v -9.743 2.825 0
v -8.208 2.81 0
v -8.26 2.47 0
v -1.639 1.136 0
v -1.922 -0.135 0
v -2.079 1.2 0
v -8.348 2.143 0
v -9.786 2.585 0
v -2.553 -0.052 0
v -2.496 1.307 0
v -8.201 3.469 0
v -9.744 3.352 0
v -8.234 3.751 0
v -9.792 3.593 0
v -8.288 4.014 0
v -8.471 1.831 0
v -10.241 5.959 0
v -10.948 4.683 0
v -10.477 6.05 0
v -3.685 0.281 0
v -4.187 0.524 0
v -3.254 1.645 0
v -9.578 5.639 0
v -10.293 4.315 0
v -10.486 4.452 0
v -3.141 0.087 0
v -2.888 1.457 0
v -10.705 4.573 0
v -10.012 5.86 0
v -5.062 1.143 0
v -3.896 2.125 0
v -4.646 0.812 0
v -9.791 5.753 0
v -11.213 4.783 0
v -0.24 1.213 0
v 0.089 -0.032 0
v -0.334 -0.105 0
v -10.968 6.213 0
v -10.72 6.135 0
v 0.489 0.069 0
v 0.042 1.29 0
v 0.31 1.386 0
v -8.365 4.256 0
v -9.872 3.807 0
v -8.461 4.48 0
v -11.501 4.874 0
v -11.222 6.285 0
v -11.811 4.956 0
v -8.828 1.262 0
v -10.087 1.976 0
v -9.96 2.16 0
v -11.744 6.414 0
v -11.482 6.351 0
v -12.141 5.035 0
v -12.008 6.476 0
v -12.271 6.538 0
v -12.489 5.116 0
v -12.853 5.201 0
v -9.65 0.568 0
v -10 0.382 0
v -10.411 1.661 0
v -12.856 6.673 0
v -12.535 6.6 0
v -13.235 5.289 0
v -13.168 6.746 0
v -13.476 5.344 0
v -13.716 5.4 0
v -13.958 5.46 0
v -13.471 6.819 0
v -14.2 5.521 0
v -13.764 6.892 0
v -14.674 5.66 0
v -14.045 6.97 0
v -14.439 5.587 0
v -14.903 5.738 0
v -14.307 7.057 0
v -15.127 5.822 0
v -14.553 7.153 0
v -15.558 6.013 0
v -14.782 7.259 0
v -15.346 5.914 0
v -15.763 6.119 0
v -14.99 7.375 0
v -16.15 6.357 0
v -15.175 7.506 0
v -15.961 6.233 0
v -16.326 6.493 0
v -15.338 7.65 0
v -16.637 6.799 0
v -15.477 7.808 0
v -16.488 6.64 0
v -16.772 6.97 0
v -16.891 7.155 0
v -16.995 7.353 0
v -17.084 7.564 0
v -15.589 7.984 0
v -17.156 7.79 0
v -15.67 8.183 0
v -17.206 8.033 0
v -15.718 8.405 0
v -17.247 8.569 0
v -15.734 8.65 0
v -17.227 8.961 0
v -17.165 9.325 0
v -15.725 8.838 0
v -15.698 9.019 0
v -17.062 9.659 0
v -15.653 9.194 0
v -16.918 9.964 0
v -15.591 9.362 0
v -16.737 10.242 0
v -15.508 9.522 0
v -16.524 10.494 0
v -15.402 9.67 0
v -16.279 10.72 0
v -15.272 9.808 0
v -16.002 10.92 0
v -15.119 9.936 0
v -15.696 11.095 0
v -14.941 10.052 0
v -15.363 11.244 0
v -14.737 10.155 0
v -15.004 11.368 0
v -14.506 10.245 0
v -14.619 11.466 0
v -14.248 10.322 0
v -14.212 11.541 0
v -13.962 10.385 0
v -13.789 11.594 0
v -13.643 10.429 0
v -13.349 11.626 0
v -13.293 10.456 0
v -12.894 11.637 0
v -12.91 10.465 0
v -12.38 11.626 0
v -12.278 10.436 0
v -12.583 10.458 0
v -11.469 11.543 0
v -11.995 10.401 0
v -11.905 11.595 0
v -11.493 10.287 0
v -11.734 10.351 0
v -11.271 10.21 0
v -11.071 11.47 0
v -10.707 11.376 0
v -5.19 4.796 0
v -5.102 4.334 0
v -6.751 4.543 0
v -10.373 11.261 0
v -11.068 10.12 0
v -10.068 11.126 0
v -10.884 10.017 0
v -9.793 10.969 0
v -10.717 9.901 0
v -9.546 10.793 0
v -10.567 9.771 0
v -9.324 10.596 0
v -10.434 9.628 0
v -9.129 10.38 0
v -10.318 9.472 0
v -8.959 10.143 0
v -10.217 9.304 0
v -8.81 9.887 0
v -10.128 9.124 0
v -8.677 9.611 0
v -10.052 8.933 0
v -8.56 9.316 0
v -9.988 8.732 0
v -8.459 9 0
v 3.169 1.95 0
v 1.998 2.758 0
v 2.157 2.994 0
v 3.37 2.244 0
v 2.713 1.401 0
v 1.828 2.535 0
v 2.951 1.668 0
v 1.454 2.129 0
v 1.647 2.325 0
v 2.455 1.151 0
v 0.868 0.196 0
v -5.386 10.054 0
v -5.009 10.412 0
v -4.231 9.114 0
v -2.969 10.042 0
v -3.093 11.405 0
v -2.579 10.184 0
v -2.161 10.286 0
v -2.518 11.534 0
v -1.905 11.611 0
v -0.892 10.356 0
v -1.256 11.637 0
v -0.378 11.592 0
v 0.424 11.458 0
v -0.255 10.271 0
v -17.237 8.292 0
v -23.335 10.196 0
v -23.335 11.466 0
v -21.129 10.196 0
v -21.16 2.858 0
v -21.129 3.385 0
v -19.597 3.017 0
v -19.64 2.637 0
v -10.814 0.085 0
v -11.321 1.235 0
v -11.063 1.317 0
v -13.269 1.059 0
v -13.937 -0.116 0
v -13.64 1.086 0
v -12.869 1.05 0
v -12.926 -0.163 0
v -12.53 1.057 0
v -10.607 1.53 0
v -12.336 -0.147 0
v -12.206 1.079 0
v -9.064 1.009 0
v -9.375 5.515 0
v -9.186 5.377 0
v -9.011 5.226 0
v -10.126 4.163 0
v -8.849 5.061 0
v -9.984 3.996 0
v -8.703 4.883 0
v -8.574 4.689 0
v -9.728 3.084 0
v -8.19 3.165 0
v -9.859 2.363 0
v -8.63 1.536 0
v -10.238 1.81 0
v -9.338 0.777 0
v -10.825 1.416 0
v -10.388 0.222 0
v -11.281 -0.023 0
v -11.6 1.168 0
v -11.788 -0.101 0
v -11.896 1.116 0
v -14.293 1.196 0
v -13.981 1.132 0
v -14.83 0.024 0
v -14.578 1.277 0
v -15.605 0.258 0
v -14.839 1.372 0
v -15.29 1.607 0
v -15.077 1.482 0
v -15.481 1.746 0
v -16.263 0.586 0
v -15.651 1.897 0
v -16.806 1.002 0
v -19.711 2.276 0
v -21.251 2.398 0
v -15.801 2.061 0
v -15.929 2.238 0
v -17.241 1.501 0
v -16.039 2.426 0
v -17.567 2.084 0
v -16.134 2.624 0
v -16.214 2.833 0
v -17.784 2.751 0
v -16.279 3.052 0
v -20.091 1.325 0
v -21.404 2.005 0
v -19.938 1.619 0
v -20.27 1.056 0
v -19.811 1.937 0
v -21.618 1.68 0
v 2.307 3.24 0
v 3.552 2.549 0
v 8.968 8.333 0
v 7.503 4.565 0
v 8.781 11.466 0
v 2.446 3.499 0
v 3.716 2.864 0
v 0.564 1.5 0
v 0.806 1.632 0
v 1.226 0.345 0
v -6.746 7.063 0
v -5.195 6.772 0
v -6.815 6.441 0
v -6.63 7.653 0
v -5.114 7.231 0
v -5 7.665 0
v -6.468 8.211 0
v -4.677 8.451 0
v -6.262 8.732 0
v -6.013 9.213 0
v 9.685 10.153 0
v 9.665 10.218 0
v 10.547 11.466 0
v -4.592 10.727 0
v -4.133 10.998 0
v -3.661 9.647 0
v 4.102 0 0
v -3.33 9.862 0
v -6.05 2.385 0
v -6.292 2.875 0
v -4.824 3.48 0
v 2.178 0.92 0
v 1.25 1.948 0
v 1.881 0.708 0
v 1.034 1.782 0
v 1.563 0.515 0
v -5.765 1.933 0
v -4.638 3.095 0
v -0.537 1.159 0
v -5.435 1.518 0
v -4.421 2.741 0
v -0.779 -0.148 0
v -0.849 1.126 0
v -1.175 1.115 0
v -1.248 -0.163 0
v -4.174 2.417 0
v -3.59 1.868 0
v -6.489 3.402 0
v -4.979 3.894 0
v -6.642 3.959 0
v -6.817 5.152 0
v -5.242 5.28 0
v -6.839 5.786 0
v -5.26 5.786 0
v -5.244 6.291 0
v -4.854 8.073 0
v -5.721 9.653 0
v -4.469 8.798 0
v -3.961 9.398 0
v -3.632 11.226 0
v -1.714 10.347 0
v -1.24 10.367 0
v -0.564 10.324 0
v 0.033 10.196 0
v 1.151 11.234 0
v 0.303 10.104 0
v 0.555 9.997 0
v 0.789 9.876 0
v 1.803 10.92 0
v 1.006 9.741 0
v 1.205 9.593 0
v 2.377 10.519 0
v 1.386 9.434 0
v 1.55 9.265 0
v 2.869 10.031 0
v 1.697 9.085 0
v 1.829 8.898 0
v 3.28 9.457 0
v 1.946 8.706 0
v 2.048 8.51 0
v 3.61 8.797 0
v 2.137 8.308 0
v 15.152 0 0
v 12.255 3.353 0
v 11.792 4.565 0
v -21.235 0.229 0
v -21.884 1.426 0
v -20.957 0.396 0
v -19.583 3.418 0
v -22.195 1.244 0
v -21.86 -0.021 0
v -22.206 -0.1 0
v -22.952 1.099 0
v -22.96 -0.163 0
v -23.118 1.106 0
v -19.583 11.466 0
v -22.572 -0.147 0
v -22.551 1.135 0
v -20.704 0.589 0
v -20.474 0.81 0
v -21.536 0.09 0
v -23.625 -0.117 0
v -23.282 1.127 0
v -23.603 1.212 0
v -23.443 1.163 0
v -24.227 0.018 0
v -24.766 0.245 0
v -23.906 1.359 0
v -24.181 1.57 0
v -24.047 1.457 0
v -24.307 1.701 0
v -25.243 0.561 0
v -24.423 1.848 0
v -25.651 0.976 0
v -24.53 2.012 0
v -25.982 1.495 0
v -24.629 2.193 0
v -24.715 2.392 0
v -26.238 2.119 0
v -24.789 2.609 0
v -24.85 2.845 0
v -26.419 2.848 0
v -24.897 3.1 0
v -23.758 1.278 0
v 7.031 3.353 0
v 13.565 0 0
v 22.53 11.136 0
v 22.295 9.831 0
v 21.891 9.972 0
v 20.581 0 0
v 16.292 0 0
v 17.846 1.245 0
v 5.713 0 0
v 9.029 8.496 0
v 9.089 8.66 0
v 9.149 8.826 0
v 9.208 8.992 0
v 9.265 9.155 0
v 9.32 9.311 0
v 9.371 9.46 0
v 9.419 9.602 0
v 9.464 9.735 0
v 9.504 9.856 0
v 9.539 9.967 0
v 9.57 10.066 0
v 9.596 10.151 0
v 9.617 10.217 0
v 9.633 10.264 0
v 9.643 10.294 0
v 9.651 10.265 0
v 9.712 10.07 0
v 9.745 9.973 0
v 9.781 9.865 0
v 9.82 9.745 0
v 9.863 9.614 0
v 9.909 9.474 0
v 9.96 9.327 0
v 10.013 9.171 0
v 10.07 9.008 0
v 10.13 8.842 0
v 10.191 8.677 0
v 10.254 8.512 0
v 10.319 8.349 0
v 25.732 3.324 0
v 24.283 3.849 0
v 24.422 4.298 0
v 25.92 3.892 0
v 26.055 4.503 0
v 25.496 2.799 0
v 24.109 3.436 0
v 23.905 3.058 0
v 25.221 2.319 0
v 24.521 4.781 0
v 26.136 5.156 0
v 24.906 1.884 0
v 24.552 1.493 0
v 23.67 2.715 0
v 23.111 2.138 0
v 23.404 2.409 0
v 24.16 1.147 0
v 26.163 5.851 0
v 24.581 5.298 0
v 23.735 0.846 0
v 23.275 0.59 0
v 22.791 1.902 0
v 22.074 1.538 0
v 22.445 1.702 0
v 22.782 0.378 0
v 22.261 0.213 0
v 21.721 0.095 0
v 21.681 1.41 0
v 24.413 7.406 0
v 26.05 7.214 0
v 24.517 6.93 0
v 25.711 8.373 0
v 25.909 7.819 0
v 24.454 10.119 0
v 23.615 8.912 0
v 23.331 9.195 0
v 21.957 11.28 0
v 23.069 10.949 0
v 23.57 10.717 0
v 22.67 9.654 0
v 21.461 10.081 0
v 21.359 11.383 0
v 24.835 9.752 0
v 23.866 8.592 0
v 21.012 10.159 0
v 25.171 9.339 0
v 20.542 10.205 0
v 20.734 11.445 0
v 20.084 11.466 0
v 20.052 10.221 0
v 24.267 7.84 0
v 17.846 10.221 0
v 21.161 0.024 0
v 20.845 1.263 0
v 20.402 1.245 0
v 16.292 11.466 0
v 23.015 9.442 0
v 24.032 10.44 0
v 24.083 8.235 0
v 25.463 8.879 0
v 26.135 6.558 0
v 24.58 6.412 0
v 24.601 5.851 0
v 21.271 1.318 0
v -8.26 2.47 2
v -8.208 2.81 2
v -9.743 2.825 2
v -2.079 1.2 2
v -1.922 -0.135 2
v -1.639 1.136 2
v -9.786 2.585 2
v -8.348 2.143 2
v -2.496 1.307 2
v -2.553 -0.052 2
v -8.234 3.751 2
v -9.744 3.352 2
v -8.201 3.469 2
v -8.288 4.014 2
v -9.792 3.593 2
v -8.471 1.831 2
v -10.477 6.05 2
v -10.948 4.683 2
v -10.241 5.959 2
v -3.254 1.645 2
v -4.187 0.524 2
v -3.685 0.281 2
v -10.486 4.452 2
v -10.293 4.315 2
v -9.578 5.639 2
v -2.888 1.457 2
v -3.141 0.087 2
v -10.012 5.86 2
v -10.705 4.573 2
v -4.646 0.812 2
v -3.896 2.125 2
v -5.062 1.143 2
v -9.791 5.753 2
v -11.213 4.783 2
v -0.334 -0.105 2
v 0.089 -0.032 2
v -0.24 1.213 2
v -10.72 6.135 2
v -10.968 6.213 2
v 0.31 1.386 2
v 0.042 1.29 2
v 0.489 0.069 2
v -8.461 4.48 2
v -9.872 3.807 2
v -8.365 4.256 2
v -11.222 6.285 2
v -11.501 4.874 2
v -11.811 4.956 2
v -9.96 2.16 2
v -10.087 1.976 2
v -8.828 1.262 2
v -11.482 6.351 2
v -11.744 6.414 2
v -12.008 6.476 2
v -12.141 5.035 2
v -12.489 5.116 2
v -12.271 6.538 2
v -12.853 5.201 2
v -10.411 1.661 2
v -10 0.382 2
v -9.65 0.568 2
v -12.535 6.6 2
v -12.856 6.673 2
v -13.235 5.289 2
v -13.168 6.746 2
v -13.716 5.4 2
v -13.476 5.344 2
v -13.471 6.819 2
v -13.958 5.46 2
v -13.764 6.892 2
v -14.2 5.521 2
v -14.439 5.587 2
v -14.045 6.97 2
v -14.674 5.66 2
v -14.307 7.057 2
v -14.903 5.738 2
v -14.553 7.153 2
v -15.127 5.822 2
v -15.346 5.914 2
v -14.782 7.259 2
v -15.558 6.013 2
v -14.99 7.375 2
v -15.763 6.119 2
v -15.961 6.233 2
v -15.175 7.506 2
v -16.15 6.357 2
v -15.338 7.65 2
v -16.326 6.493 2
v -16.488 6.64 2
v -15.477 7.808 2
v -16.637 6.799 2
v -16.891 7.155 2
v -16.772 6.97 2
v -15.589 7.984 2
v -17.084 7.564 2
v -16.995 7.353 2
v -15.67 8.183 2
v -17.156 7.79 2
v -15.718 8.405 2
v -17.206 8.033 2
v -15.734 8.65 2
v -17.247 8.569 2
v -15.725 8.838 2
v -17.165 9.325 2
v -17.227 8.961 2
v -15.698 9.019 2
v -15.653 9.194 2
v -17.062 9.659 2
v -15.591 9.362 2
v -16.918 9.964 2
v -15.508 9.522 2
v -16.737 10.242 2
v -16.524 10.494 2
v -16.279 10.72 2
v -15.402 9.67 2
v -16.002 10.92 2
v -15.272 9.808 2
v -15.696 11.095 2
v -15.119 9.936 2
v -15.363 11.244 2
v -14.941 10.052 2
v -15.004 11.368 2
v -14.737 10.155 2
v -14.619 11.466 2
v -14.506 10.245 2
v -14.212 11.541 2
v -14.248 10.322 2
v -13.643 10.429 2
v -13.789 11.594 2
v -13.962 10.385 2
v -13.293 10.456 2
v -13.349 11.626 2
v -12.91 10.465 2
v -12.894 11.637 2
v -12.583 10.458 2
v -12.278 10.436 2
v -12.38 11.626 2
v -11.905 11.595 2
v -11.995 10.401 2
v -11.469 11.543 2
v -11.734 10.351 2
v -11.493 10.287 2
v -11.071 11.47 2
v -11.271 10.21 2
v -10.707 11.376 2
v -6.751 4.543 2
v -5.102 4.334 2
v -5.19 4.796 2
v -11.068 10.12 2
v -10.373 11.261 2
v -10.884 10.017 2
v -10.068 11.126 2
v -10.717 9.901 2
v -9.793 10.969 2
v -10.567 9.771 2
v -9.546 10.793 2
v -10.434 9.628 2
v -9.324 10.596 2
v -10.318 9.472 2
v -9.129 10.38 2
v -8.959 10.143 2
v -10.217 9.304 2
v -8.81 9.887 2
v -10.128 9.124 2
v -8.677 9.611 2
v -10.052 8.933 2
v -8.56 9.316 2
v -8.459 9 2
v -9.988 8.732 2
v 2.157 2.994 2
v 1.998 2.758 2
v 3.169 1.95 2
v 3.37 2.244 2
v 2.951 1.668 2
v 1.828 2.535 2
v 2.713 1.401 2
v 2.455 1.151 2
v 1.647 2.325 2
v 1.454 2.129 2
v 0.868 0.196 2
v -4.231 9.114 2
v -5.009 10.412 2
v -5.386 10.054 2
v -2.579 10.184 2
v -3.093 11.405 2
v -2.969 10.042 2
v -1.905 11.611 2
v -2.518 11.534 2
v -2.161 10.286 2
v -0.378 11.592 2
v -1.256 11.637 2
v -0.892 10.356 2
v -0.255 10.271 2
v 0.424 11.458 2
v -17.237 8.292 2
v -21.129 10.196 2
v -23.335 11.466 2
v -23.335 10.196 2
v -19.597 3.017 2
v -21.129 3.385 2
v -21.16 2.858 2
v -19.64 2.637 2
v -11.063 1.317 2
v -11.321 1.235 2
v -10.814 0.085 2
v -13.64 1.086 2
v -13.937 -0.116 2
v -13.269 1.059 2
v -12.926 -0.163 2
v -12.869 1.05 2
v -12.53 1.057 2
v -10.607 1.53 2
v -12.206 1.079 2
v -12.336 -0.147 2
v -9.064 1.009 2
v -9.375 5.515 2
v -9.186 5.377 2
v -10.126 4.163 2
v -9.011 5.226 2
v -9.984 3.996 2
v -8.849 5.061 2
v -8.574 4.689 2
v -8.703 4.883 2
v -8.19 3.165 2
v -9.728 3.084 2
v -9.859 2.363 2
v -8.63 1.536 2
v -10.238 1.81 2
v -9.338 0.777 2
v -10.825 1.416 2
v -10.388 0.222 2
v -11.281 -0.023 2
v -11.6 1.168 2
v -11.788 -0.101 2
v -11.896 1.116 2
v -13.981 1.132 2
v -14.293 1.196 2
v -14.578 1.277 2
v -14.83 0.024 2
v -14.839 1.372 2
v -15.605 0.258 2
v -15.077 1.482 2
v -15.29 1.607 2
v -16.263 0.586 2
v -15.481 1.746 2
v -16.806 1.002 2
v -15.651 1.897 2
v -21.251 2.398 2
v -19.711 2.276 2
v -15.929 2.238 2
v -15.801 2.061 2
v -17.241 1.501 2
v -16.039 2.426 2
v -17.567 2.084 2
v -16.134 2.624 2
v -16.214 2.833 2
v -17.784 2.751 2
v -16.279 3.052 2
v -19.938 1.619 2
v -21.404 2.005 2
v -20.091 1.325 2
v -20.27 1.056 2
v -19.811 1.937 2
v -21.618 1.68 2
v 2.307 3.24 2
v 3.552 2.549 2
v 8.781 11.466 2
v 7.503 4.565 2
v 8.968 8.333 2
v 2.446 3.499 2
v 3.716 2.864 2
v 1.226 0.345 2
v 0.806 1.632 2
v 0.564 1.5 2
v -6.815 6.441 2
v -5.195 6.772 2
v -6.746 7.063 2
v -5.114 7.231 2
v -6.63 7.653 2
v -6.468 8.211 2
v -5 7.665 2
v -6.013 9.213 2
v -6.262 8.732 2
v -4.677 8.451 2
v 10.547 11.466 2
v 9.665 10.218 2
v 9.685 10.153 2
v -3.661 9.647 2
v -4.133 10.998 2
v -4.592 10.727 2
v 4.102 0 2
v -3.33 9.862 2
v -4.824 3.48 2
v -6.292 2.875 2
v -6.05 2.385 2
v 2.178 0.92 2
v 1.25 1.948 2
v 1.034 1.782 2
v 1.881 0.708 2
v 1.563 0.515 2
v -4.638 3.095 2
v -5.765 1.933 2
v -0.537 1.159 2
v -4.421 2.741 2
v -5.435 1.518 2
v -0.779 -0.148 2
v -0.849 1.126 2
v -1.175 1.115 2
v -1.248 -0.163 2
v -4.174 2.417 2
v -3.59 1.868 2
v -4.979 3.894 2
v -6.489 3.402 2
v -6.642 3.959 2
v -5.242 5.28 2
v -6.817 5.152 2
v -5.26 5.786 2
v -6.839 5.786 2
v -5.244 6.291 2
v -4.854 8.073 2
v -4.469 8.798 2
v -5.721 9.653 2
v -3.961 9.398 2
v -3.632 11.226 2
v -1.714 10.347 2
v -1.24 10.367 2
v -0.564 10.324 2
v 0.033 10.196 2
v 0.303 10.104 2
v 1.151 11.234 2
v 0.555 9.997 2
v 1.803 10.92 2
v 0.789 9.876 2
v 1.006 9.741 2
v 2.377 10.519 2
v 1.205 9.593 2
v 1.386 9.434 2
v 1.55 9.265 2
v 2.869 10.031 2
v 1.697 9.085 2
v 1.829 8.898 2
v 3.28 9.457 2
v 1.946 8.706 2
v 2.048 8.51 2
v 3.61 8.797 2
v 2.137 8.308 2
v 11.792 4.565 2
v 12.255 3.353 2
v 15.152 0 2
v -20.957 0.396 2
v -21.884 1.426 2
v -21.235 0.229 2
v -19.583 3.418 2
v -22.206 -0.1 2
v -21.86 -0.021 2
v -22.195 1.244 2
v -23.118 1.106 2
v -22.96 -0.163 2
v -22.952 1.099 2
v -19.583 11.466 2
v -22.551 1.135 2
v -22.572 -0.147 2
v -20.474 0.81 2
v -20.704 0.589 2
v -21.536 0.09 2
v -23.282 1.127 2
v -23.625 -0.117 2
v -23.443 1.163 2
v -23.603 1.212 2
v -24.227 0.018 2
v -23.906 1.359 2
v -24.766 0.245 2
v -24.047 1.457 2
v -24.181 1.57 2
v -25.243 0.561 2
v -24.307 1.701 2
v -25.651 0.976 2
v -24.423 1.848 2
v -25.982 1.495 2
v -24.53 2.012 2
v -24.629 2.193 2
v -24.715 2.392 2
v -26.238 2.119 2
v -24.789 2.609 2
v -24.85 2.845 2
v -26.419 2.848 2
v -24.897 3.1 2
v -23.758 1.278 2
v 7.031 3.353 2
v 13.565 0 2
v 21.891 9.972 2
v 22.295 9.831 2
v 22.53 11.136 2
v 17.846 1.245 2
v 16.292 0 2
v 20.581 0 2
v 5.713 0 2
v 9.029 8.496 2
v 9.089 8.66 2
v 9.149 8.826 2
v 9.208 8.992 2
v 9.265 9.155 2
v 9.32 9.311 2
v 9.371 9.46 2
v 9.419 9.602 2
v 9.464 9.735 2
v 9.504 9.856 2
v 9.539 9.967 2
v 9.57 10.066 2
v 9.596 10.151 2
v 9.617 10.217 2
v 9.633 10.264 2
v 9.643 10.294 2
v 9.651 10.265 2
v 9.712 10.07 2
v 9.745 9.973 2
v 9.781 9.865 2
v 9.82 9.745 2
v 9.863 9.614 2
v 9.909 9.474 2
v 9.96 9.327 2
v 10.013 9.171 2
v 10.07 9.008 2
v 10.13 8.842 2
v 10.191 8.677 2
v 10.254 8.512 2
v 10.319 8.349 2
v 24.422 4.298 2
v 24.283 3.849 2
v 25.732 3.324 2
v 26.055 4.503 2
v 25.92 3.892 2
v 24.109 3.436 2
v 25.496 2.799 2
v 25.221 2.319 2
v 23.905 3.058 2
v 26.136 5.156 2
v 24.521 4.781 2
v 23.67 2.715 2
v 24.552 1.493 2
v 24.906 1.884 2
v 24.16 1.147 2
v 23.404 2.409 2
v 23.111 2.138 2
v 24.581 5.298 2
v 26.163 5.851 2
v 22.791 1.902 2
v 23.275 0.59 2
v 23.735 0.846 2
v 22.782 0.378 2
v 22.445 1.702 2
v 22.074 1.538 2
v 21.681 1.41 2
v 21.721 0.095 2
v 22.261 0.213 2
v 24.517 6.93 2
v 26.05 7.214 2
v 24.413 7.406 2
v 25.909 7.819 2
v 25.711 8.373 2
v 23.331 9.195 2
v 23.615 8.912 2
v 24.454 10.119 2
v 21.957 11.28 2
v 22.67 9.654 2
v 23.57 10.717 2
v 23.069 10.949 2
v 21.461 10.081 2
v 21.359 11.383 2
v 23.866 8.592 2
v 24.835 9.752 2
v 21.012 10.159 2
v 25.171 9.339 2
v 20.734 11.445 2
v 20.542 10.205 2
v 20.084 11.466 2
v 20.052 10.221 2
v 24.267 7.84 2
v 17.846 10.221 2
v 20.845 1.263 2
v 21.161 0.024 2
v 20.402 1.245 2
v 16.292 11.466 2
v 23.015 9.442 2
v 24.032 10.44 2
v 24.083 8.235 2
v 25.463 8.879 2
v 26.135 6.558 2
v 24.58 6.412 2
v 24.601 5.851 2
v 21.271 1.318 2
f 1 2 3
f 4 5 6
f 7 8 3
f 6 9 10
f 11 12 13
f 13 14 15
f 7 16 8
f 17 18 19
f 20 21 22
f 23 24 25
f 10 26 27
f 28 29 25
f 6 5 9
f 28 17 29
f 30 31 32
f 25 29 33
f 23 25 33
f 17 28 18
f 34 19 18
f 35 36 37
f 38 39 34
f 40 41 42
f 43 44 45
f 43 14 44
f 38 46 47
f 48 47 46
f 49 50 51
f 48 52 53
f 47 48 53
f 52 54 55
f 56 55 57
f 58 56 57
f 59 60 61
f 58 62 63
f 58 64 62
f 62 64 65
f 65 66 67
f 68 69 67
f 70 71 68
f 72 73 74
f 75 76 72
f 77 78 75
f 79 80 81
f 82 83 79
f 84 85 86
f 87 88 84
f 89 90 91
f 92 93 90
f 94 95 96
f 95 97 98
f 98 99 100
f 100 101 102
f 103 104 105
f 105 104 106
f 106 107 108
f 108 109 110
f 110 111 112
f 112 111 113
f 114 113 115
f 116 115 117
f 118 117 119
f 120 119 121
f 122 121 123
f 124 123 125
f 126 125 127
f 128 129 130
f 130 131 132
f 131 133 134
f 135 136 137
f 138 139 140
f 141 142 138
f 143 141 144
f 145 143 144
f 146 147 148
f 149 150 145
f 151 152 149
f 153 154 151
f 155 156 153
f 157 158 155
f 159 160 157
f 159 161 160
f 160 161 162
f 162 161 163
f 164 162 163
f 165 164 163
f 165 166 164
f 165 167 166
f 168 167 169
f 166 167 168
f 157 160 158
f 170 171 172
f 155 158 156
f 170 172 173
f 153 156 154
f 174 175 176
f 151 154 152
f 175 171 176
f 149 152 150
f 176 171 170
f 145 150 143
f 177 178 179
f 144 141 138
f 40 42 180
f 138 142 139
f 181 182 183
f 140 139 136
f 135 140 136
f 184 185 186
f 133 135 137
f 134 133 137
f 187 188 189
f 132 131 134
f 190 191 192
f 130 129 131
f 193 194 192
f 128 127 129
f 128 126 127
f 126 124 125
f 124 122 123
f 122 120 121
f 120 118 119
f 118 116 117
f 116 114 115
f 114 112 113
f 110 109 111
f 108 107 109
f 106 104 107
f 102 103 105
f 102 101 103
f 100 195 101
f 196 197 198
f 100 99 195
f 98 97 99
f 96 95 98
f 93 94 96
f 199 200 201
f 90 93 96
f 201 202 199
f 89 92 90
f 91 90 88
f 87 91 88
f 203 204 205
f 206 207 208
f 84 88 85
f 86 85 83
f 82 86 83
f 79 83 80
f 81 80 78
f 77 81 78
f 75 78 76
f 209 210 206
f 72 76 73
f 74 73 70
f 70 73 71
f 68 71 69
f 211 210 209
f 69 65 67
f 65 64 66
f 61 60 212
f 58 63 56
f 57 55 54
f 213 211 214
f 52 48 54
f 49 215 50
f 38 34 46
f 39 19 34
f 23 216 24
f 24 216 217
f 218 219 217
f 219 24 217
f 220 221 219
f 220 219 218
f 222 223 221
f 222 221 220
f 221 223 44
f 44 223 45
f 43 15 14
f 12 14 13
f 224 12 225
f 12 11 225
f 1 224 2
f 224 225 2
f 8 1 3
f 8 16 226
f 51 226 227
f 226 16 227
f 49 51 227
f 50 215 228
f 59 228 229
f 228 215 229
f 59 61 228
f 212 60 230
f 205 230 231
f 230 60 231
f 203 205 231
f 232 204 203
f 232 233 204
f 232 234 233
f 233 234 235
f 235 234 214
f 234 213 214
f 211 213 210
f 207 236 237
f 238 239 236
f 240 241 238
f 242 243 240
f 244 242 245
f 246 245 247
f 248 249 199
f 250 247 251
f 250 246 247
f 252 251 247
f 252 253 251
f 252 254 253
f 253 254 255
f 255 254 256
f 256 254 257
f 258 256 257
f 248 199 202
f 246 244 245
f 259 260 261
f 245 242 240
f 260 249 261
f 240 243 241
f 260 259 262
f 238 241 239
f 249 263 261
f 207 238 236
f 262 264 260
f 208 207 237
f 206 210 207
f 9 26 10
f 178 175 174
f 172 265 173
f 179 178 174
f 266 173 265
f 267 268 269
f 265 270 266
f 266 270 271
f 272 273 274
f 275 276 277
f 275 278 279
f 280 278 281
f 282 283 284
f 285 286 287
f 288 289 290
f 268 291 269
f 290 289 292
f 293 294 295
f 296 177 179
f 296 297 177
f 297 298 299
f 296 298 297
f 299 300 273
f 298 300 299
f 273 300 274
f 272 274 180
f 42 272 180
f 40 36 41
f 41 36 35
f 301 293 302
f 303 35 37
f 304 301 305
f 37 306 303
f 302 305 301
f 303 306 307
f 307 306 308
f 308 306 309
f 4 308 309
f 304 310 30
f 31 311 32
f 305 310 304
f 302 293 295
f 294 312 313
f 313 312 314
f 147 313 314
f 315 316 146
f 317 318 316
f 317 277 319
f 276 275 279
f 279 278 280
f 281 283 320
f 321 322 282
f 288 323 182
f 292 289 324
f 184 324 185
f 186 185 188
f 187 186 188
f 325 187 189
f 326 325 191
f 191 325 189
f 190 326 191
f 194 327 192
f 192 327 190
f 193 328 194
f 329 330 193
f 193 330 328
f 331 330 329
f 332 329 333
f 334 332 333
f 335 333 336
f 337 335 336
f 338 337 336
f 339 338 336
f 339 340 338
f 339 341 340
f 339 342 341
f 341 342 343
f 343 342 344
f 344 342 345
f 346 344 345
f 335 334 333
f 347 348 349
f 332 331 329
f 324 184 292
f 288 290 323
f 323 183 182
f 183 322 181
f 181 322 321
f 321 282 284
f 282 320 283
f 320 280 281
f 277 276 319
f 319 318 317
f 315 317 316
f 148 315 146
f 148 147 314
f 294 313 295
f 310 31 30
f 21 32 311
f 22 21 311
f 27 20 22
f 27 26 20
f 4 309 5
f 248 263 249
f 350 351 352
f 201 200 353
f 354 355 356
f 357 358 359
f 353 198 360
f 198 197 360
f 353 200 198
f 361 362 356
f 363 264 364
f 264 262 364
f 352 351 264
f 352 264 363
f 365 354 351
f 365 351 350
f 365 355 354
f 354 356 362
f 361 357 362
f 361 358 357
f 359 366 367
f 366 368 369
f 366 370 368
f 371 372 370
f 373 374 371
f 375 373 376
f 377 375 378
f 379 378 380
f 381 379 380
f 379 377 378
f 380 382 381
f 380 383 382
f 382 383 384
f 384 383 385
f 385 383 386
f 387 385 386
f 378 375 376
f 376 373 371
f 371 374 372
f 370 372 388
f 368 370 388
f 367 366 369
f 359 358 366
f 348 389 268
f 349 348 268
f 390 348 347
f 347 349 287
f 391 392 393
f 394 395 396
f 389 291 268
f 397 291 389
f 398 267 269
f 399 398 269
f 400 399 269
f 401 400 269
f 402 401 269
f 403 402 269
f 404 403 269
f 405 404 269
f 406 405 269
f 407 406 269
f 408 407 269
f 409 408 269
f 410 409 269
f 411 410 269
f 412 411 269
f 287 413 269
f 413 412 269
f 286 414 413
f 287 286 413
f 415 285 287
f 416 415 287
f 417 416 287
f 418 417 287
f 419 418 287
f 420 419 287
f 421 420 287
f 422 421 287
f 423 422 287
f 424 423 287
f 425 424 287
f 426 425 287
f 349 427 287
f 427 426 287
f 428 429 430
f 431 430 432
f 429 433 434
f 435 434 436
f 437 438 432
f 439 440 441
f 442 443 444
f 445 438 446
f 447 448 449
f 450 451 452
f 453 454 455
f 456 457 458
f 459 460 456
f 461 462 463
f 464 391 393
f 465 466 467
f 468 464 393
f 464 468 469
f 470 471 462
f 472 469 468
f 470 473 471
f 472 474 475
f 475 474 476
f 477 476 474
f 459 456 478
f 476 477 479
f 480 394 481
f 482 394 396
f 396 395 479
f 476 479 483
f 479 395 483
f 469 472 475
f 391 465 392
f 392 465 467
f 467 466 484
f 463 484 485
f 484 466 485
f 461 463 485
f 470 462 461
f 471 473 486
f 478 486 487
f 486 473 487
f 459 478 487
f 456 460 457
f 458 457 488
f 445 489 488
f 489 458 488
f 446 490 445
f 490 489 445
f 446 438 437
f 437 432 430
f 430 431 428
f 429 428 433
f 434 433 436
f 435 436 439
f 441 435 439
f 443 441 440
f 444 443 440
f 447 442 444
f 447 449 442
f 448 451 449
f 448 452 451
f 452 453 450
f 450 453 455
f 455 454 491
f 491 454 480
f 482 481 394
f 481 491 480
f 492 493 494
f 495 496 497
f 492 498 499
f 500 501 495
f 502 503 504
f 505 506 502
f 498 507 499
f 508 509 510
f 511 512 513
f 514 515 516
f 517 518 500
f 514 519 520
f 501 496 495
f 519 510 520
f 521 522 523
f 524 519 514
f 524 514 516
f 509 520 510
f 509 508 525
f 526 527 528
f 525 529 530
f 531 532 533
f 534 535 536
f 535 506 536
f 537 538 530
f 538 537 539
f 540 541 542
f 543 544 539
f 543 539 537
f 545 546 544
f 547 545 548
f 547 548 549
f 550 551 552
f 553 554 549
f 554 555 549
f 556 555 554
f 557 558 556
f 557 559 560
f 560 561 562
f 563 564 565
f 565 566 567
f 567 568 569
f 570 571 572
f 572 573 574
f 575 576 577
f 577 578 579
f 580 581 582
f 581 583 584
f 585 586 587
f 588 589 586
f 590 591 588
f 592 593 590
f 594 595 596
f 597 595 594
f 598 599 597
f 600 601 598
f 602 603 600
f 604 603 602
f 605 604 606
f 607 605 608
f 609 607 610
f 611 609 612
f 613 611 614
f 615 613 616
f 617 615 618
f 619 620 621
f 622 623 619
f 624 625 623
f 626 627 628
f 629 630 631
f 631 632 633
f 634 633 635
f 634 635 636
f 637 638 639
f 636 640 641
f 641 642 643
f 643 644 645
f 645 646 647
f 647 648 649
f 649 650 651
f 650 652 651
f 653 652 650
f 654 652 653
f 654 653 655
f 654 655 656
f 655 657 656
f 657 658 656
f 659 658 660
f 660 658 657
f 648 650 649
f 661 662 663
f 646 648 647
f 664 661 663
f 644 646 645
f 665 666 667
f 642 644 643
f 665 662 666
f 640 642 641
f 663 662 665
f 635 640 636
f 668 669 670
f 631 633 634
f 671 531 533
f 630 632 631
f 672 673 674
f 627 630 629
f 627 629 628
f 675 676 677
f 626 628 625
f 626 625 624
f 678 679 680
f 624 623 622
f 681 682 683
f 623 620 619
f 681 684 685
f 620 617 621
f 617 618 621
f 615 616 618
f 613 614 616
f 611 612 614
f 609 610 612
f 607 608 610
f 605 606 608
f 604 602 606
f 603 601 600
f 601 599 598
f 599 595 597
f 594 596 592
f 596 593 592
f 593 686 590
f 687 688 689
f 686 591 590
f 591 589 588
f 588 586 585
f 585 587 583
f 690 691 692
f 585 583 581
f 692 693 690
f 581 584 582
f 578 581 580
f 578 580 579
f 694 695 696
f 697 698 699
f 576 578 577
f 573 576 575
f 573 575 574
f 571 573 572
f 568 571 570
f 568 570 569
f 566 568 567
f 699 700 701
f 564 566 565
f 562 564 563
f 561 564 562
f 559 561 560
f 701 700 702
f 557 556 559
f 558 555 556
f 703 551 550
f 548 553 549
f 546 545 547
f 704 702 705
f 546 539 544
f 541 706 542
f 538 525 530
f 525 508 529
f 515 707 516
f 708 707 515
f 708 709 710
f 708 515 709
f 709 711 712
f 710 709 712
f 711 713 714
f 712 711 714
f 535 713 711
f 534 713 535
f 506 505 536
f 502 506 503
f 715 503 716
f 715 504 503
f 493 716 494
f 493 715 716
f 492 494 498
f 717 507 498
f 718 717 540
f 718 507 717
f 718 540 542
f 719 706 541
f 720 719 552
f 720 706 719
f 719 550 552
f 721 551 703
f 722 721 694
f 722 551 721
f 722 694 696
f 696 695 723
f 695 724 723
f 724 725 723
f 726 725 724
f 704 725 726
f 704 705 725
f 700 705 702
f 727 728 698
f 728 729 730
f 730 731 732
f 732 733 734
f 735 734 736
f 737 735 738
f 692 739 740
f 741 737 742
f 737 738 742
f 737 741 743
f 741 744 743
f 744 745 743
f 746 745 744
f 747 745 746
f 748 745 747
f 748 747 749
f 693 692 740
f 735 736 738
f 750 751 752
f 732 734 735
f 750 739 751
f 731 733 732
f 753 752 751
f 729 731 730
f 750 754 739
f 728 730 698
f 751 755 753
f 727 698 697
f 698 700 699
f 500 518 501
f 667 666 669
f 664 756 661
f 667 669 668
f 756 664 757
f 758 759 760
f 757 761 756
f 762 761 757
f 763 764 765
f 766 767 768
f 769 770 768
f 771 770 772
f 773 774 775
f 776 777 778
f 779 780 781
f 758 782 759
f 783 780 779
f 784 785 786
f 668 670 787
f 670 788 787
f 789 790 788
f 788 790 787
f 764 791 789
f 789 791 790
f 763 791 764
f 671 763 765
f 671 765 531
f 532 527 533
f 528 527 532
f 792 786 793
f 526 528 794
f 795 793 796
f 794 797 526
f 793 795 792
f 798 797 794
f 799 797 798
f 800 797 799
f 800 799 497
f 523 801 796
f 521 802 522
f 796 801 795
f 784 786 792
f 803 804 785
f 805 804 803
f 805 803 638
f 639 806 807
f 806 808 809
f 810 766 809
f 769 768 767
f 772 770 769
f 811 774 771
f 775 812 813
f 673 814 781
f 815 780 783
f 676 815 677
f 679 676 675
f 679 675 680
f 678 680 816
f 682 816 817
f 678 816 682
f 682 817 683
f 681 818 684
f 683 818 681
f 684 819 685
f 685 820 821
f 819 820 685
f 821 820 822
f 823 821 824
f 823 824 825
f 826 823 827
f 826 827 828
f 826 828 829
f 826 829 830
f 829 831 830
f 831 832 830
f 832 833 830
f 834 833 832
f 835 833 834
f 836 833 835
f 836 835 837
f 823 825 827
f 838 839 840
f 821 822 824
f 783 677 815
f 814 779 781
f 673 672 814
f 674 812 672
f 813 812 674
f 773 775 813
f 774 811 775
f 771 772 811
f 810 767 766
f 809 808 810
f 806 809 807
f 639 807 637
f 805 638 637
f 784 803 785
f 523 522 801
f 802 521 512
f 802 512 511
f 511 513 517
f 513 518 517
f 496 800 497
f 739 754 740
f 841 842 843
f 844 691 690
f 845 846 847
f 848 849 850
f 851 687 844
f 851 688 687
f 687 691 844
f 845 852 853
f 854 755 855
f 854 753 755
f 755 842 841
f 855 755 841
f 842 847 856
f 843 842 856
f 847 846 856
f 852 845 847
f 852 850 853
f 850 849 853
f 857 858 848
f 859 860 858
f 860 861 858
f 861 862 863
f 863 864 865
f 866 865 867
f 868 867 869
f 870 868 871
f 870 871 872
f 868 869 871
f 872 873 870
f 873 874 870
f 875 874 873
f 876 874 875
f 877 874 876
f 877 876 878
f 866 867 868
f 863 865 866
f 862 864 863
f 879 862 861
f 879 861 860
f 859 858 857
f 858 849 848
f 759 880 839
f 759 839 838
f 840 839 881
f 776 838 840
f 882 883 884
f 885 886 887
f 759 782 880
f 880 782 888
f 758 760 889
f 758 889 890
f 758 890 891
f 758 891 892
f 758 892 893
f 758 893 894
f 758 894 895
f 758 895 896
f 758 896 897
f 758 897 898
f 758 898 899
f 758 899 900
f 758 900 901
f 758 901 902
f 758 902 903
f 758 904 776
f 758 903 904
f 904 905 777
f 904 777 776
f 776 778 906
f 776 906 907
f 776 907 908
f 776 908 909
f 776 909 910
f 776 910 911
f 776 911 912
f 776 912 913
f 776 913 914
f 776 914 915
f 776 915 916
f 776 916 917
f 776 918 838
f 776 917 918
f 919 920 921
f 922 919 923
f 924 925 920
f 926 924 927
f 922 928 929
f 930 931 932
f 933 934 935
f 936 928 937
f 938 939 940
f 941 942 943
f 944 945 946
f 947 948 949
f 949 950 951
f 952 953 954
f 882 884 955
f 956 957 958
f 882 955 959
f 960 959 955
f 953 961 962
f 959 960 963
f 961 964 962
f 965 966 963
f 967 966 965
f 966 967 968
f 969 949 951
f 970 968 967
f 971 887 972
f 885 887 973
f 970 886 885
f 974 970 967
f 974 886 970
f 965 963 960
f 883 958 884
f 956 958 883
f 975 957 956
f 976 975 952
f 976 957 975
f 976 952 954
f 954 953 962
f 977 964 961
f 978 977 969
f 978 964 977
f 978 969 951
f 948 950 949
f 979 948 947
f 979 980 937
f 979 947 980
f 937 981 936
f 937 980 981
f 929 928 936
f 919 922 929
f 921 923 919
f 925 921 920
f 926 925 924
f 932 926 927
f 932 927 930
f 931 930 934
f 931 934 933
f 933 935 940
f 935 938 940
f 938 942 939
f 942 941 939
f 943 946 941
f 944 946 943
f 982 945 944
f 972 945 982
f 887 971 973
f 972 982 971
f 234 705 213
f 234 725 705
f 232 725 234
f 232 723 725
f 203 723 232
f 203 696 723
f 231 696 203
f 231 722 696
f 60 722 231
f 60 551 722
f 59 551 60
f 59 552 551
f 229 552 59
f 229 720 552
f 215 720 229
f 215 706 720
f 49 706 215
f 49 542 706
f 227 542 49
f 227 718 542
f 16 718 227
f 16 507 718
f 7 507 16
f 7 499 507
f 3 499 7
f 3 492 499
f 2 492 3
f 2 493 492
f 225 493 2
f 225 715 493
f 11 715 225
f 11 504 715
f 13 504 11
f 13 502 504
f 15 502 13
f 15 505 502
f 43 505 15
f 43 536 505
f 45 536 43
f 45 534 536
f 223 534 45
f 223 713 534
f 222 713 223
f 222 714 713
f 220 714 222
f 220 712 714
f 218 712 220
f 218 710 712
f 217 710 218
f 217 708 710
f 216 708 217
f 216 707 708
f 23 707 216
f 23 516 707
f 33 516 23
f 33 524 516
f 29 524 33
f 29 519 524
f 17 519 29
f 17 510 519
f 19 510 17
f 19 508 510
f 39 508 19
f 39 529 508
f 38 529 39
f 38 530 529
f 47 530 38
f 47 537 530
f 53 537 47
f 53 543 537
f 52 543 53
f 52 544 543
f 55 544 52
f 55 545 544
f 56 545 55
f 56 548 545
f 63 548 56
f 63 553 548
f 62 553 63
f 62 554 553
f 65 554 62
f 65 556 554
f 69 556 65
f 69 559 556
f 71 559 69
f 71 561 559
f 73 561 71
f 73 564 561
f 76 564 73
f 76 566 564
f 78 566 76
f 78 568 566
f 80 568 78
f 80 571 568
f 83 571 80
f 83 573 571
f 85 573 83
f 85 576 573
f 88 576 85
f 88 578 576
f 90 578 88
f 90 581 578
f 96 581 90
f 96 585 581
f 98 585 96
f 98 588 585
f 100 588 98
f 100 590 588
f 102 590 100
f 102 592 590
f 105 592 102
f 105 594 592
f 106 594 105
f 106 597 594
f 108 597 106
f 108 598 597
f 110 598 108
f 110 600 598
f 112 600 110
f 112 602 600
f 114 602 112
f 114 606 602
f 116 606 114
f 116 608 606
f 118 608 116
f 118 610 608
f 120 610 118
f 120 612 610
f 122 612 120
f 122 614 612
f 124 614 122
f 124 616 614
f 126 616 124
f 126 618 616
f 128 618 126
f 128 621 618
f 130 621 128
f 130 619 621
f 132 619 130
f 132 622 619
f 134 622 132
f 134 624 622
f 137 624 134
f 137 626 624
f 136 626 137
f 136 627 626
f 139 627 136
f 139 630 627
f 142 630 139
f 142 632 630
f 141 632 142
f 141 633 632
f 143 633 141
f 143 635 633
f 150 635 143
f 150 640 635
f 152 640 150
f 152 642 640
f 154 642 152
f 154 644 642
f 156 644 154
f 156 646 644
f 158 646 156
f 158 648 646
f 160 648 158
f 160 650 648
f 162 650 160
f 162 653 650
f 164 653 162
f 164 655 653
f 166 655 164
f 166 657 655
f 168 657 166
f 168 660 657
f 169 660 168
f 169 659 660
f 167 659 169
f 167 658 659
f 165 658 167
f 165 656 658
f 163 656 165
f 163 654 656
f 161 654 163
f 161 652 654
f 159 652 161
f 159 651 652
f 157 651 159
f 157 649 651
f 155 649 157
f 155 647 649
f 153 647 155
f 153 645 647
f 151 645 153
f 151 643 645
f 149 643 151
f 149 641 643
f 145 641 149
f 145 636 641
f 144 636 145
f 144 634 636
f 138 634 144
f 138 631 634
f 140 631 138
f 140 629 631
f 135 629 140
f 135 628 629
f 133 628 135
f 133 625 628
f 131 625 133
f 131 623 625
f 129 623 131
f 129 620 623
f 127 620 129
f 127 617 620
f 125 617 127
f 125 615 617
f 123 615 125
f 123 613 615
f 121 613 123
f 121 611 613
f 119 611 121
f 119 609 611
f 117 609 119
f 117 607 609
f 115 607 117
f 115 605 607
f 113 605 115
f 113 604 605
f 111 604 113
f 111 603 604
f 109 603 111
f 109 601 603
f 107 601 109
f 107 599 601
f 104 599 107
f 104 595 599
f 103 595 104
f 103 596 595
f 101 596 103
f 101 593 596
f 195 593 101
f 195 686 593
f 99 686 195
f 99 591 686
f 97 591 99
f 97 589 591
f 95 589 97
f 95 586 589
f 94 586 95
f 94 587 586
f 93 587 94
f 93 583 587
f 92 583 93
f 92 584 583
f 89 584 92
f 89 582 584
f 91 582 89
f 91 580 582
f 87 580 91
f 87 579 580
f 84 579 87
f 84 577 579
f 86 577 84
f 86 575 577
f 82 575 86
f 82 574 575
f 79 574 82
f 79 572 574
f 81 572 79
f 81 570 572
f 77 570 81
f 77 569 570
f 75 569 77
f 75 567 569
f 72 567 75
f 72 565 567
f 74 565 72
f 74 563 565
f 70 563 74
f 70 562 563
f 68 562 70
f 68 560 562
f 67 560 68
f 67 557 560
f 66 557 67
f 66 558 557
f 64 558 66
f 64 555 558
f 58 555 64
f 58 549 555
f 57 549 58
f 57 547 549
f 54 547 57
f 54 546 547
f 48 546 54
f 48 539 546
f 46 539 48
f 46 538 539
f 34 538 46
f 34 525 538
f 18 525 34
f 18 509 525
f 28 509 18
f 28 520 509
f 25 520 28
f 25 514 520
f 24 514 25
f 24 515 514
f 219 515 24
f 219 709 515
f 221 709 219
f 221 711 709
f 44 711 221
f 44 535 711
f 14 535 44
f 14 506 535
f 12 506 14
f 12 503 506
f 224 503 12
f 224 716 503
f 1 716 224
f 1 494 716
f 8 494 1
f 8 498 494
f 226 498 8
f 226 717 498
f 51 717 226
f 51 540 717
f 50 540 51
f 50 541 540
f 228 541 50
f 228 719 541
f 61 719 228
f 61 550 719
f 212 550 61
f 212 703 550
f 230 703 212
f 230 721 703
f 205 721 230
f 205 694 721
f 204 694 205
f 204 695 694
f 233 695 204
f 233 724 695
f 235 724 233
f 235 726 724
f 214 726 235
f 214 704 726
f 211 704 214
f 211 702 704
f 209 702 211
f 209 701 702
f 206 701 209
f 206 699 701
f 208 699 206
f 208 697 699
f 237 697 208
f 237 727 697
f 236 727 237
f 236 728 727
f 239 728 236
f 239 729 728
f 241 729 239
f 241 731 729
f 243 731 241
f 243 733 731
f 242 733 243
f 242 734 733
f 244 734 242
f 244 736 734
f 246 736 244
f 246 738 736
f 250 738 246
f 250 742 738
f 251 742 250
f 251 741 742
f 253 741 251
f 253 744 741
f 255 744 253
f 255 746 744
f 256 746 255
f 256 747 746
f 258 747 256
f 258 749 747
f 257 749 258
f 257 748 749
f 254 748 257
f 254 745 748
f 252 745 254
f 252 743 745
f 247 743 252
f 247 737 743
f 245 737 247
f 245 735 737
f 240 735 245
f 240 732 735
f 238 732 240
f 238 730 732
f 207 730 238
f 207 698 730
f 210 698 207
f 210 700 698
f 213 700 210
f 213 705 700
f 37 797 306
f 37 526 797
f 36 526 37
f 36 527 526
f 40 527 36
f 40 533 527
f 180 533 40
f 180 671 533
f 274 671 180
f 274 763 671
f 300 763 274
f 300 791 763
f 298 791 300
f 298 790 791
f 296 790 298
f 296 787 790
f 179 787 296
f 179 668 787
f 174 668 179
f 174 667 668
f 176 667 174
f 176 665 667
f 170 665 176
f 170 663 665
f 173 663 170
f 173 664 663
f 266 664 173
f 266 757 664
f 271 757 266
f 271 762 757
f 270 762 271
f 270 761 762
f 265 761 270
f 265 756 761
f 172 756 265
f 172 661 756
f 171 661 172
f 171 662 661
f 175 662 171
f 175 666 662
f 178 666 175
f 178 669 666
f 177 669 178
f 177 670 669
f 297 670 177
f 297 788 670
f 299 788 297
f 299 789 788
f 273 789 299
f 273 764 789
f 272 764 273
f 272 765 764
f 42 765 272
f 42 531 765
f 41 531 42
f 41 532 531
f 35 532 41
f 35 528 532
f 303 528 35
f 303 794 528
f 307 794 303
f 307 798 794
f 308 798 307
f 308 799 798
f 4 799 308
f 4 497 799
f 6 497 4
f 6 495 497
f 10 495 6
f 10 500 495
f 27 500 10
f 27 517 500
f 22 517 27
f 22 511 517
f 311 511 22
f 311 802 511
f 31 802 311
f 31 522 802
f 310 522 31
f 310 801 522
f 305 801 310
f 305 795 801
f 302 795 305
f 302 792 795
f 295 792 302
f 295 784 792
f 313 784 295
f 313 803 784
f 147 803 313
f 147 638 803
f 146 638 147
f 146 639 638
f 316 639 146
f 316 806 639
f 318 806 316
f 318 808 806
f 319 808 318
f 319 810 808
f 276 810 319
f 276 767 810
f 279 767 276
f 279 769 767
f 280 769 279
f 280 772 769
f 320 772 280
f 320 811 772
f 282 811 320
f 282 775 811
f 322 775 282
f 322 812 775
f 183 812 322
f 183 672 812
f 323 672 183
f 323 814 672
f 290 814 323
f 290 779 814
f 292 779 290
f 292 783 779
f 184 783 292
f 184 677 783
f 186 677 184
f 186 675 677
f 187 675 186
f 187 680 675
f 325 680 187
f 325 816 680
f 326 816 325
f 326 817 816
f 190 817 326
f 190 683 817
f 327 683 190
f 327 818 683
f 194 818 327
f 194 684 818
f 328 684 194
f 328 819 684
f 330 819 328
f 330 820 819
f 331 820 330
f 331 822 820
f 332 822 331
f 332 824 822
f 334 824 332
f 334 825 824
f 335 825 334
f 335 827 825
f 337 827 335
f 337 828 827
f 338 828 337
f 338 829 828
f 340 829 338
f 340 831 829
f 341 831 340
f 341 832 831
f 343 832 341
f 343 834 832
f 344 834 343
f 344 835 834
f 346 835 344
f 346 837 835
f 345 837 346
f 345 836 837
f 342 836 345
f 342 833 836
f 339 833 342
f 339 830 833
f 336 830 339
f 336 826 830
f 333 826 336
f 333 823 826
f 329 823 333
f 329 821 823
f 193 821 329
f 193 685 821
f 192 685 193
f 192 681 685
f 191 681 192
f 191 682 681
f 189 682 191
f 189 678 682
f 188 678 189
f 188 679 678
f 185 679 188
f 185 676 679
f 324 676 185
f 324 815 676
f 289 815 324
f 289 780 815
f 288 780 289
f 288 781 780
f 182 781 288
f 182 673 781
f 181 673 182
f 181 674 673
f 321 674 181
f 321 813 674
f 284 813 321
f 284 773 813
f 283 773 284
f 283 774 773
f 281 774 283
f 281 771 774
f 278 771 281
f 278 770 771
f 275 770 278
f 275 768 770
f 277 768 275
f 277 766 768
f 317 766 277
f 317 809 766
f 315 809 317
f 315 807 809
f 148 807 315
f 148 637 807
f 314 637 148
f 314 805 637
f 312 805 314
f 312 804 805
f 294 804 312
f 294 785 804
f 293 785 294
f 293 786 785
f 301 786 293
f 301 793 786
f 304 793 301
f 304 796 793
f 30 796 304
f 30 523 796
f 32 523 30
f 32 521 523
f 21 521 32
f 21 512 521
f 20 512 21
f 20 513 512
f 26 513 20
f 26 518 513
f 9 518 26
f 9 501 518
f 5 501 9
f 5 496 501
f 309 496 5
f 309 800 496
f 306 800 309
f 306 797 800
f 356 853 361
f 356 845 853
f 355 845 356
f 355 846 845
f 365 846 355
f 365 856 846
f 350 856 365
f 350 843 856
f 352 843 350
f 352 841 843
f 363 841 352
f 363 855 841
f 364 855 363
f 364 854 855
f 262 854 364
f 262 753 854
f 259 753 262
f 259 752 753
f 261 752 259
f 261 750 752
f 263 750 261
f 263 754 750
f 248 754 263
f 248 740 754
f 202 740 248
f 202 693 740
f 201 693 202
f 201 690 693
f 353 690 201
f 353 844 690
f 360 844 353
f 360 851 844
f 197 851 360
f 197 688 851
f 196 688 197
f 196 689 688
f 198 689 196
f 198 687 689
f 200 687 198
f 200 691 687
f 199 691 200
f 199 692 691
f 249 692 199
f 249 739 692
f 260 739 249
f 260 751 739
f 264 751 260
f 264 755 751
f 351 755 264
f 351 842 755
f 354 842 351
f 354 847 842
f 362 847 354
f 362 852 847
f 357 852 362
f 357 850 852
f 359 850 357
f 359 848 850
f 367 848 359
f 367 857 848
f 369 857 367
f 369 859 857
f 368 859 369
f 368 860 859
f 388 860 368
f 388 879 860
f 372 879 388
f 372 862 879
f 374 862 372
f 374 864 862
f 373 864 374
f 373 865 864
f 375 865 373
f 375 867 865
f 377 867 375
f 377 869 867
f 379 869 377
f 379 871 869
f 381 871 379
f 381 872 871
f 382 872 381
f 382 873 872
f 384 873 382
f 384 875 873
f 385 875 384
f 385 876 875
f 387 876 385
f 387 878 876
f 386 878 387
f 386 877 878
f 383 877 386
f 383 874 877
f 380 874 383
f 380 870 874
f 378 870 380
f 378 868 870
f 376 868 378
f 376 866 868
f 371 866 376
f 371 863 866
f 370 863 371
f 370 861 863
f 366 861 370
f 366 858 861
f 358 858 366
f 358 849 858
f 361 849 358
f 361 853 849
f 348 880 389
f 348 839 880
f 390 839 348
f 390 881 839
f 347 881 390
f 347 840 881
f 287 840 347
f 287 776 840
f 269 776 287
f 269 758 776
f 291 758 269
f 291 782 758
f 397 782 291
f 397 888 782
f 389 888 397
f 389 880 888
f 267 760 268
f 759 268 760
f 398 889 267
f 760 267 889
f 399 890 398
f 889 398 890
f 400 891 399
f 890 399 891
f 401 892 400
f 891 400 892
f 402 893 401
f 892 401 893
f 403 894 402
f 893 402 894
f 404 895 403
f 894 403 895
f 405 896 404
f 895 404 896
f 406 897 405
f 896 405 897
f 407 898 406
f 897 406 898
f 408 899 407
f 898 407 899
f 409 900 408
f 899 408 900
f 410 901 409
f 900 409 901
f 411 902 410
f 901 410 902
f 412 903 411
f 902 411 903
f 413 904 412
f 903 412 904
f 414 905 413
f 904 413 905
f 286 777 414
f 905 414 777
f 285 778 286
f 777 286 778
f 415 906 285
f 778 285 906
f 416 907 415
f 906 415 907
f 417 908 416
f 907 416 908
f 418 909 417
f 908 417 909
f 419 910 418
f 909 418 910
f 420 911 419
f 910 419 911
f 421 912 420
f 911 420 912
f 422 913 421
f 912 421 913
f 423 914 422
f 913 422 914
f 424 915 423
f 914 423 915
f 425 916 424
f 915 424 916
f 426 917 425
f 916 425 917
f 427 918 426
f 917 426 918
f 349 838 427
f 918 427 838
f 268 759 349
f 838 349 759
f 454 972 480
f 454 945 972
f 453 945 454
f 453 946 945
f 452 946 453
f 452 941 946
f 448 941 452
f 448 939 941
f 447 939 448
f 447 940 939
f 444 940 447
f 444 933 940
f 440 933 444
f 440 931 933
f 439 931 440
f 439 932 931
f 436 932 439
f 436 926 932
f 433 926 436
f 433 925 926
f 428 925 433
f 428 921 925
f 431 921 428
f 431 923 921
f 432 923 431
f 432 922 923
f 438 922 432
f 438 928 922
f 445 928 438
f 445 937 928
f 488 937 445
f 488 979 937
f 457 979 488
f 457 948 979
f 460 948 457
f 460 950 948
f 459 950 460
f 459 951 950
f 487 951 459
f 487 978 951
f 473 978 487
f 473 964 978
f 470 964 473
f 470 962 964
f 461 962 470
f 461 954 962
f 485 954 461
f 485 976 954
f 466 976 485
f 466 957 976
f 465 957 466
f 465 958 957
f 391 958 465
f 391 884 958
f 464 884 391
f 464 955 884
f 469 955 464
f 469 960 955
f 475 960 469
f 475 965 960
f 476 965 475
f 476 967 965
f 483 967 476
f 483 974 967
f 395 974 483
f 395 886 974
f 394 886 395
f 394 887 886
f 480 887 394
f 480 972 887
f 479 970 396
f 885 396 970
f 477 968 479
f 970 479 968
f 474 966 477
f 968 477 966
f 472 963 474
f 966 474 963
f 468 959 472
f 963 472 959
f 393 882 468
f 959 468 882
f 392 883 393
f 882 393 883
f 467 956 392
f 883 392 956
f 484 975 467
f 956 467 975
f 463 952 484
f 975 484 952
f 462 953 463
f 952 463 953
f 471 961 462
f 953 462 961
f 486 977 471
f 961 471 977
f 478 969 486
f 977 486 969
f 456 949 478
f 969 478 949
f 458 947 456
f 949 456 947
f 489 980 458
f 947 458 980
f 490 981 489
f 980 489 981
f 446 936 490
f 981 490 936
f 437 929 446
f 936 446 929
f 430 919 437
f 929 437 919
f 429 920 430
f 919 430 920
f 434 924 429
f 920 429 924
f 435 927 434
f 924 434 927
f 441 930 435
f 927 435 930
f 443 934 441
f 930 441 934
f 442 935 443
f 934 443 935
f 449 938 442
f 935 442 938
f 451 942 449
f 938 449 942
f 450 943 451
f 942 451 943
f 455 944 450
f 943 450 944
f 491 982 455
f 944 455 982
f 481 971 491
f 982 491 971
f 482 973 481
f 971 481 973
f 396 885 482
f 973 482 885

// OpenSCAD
// Text with default font (Hershey Simplex)
linear_extrude(height = 2)
  text("JSCAD", size = 12, halign = "center");
